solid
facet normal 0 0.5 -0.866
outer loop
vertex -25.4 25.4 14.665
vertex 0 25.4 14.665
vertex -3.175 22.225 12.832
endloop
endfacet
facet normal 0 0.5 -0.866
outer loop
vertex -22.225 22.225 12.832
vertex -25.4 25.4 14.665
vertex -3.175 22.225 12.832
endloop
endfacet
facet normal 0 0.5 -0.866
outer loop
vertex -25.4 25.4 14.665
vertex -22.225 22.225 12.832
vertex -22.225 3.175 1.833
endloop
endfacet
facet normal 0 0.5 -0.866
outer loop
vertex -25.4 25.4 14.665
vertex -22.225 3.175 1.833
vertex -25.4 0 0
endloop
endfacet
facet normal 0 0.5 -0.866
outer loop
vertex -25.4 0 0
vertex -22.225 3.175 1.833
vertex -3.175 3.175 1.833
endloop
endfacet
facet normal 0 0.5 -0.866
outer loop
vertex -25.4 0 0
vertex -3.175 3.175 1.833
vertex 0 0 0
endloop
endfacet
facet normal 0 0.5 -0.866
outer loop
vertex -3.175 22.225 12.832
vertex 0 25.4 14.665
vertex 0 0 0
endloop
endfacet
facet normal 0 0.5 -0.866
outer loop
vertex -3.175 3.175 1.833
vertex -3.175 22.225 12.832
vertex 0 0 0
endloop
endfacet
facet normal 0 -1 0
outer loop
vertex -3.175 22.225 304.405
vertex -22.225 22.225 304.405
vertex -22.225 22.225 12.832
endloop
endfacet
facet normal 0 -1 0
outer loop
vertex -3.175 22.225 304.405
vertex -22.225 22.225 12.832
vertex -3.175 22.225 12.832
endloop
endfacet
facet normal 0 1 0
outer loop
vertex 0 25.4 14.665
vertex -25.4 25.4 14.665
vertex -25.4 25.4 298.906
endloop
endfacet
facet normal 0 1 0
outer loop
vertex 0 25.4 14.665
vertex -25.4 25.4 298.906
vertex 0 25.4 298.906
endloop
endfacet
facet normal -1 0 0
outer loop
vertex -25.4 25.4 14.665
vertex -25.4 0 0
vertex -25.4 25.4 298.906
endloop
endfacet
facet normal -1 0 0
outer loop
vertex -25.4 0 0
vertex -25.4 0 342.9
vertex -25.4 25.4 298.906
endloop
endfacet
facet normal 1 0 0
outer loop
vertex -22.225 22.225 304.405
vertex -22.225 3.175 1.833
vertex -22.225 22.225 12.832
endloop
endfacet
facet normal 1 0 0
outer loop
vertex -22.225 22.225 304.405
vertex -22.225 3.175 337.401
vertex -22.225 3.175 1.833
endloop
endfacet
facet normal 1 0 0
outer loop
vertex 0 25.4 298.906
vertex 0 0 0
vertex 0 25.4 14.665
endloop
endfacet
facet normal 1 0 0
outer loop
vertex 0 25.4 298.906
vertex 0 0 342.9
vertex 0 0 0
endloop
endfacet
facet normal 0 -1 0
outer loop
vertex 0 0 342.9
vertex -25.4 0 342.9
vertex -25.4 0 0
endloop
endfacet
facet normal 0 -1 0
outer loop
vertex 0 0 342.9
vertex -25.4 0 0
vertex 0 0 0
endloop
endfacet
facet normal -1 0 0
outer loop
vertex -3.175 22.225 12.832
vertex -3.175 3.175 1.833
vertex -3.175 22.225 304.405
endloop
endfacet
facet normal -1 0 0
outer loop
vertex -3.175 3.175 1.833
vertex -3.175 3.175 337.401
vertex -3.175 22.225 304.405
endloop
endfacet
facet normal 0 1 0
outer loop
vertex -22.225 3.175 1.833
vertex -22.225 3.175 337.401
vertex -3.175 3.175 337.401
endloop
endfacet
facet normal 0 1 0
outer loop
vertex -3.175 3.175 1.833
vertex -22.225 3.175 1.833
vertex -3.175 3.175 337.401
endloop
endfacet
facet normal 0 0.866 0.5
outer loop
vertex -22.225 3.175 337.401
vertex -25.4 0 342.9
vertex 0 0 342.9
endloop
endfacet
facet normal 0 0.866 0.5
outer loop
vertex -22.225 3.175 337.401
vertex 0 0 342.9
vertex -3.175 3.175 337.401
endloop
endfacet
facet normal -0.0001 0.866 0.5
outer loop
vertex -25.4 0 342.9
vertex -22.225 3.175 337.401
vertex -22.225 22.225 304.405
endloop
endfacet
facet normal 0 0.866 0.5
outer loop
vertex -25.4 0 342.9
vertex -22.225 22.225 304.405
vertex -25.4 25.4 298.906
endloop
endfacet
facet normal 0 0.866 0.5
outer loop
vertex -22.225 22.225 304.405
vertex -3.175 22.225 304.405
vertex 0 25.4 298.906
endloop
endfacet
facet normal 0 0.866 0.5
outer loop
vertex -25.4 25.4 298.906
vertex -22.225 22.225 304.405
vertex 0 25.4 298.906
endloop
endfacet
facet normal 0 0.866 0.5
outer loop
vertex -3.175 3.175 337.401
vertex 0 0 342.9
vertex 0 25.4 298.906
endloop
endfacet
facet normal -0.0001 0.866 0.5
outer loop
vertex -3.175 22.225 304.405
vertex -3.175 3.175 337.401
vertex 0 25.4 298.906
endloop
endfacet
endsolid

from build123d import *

# Parameters (mm, degrees)
F0_W     = 25.4
F0_H     = 25.4
F0_W_2   = 19.05
F0_H_2   = 19.05
F1_DEPTH = 342.9
F3_DEPTH = 25.4


with BuildPart() as f1:
    # F0 (on Top) → F1 (new body)
    with BuildSketch(Plane.XY):
        with Locations((-12.7, 12.7)):
            Rectangle(F0_W, F0_H)
        with Locations((-12.7, 12.7)):
            Rectangle(F0_W_2, F0_H_2, mode=Mode.SUBTRACT)
    extrude(amount=F1_DEPTH)

    # F2 (on face) → F3 (cut)
    with BuildSketch(Plane.YZ):
        Polygon((25.4, 342.9), (0, 342.9), (25.4, 298.905909), align=None)
        Polygon((25.4, 14.664697), (0, 0), (25.4, 0), align=None)
    extrude(amount=-F3_DEPTH, mode=Mode.SUBTRACT)


solid = f1.part
